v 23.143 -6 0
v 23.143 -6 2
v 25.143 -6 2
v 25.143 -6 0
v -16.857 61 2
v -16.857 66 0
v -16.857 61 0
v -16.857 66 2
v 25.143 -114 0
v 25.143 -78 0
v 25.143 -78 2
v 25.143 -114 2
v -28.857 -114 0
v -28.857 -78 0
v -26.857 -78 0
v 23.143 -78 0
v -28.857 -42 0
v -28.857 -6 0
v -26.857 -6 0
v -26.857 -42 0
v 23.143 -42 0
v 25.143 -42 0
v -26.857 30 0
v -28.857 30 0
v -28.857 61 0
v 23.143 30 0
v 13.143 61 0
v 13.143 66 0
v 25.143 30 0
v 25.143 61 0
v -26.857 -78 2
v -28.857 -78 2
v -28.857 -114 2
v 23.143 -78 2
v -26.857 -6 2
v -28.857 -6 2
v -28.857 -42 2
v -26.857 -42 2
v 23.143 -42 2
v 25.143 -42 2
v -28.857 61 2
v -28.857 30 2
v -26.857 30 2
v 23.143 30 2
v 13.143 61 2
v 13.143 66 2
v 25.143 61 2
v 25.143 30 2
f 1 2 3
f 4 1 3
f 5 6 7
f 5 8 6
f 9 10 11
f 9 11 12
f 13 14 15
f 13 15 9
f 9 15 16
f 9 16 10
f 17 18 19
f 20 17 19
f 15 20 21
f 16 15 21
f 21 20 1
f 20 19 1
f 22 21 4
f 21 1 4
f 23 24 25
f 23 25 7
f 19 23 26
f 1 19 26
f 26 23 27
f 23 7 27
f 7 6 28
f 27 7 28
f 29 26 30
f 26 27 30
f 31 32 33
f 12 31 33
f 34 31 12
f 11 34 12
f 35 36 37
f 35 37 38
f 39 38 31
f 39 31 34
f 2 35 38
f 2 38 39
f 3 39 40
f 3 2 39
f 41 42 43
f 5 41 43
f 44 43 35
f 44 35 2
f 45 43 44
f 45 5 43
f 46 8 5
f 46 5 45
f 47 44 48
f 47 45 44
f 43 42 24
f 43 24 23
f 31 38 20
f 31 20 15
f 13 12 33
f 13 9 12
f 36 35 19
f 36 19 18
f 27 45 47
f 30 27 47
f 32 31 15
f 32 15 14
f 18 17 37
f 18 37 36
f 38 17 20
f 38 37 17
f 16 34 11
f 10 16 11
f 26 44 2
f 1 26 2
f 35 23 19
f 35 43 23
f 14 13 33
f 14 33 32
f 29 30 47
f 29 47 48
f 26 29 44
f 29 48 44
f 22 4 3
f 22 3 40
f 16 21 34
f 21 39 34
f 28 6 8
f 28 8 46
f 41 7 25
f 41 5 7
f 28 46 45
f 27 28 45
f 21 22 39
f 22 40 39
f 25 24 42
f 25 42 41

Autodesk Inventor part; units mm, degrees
ref_plane "YZ Plane" through (0, 0, 0) normal (1, 0, 0) x (0, 1, 0)
ref_plane "XZ Plane" through (0, 0, 0) normal (0, 1, 0) x (-1, 0, 0)
ref_plane "XY Plane" through (0, 0, 0) normal (0, 0, 1) x (1, 0, 0)
sketch "Sketch1" plane through (0, 0, 0) normal (0, 0, 1) x (1, 0, 0)
  line L0 (-28.8571, 66) -> (25.1429, 66)
  line L1 (25.1429, 66) -> (25.1429, -114)
  line L2 (25.1429, -114) -> (-28.8571, -114)
  line L3 (-28.8571, -114) -> (-28.8571, 66)
  point P0 (0, 0)
  dimension "d0" = 54
  dimension "d1" = 180
extrude "Extrusion1" add sketch "Sketch1" along normal blind 2
sketch "Sketch2" plane through (0, 0, 2) normal (0, 0, 1) x (1, 0, 0)
  line L0 (25.1429, 66) -> (-28.8571, 66) projected
  line L1 (-28.8571, 66) -> (-16.8571, 66)
  line L2 (-16.8571, 66) -> (-16.8571, 61)
  line L3 (-16.8571, 61) -> (-28.8571, 61)
  line L4 (-28.8571, 61) -> (-28.8571, 66)
  line L5 (25.1429, 66) -> (13.1429, 66)
  line L6 (13.1429, 66) -> (13.1429, 61)
  line L7 (13.1429, 61) -> (25.1429, 61)
  line L8 (25.1429, 61) -> (25.1429, 66)
  point P0 (0, 0)
  dimension "d4" = 12
  dimension "d5" = 12
  dimension "d6" = 5
extrude "Extrusion2" cut sketch "Sketch2" against normal blind 2
sketch "Sketch3" plane through (0, 0, 2) normal (0, 0, 1) x (1, 0, 0)
  line L0 (-28.8571, 61) -> (-28.8571, -114) projected
  line L1 (-28.8571, 30) -> (-26.8571, 30)
  line L2 (-26.8571, 30) -> (-26.8571, -6)
  line L3 (-26.8571, -6) -> (-28.8571, -6)
  line L4 (-28.8571, -6) -> (-28.8571, 30)
  line L5 (-28.8571, -42) -> (-26.8571, -42)
  line L6 (-26.8571, -42) -> (-26.8571, -78)
  line L7 (-26.8571, -78) -> (-28.8571, -78)
  line L8 (-28.8571, -78) -> (-28.8571, -42)
  line L9 (25.1429, -114) -> (25.1429, 61) projected
  line L10 (25.1429, 30) -> (23.1429, 30)
  line L11 (23.1429, 30) -> (23.1429, -6)
  line L12 (23.1429, -6) -> (25.1429, -6)
  line L13 (25.1429, -6) -> (25.1429, 30)
  line L14 (25.1429, -42) -> (23.1429, -42)
  line L15 (23.1429, -42) -> (23.1429, -78)
  line L16 (23.1429, -78) -> (25.1429, -78)
  line L17 (25.1429, -78) -> (25.1429, -42)
  line L18 (-16.8571, 61) -> (-28.8571, 61) projected
  line L19 (-28.8571, -114) -> (25.1429, -114) projected
  point P0 (0, 0)
  point P1 (-27.8571, 30)
  point P2 (-27.8571, -42)
  point P3 (-27.8571, -6)
  point P4 (-26.8571, -60)
  point P5 (-27.8571, -78)
  dimension "d10" = 36
  dimension "d11" = 36
  dimension "d12" = 2
  dimension "d13" = 2
  dimension "d14" = 36
  dimension "d15" = 36
extrude "Extrusion3" cut sketch "Sketch3" against normal blind 2
properties part number "front_side"
